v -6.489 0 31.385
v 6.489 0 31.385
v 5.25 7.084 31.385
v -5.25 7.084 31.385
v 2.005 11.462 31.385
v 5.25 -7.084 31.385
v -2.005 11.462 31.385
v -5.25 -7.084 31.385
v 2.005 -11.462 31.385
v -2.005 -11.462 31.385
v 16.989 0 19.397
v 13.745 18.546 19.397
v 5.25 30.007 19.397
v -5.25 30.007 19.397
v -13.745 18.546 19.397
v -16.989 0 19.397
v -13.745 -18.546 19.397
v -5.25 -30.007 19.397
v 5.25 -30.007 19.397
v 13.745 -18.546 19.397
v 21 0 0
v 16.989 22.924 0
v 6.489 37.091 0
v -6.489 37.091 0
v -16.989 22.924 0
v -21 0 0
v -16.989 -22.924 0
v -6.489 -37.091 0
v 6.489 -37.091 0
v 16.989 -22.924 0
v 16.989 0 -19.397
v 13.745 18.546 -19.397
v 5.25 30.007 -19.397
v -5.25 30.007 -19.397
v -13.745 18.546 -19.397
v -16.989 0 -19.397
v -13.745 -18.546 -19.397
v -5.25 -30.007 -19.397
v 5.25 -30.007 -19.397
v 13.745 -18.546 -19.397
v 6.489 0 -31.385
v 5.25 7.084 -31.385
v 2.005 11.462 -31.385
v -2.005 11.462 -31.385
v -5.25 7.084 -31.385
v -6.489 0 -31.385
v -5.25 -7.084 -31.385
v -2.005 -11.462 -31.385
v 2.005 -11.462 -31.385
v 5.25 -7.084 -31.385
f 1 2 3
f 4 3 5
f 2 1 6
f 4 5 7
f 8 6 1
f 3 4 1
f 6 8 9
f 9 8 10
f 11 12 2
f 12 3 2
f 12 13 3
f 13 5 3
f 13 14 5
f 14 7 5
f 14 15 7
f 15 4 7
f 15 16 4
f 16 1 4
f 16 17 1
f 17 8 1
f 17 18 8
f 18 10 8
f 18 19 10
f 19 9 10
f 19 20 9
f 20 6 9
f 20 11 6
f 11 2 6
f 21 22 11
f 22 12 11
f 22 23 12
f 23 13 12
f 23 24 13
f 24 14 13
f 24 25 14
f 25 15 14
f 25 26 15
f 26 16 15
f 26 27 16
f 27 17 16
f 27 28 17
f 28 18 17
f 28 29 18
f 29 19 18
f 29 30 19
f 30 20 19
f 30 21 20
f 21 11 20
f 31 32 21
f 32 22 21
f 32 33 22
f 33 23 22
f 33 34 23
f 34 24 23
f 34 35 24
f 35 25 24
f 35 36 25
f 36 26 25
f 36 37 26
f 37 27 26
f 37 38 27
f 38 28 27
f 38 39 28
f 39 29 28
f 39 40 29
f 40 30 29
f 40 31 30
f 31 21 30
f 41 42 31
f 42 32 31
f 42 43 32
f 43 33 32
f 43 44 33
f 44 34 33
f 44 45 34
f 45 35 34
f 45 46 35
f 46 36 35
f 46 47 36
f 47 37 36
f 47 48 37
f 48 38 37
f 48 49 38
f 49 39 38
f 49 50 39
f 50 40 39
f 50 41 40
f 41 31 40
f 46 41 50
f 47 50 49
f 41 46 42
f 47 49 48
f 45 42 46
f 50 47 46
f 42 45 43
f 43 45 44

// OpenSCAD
// Generated by SolidPython 1.0.1 on 2020-07-29 00:46:47


scale(v = [7, 13, 11]) {
	sphere(r = 3);
}
/***********************************************
*********      SolidPython code:      **********
************************************************
 
# import packages: SolidPython
from solid import *
from solid.utils import *
from itertools import chain, combinations, permutations


class Resize:

    def __init__(self, scad_file):
        self.scad_file = scad_file
        #self.scad_file = import_scad(scad_file)
        # cone/cylinder param:
        self.r1 = 0
        self.r2 = 0
        self.h = 0
        # rectangular prism param:
        self.w = 0
        self.l = 0
        # ellipse param:
        self.r = 0

    # import OpenScad code (file name corresponds to shape)


    # classify shape + parameters
    def assign(self, param1, param2, param3):
        if self.scad_file == 'cone.scad':
            self.r1 = param1
            self.r2 = param2
            self.h = param3
        elif self.scad_file == 'cylinder.scad':
            self.r1 = param1
            self.r2 = param2
            self.h = param3
        elif self.scad_file == 'rectangularPrism.scad':
            self.h = param1
            self.l = param2
            self.w = param3
        else:
            self.r = param1
            self.h = param2

    # resize parameters
    def iterate(self):
        x = range(3, 20, 2)
        i = 1
        if self.scad_file == 'cone.scad':
            tempList = list(permutations(x, 2))
            for temp in tempList:
                param1 = temp[0]
                param2 = temp[1]
                filepath = 'produced_scad_files/' + 'cone' + str(param1) + '_' + str(param2) + '_' + '.scad'
                scad_render_to_file(cylinder(h=param1, r1=param2, r2=0), filepath)

        elif self.scad_file == 'cylinder.scad':
            tempList = list(permutations(x, 3))
            for temp in tempList:
                param1 = temp[0]
                param2 = temp[1]
                filepath = 'produced_scad_files/' + 'cylinder' + str(param1) + '_' + str(param2) + '_' + '.scad'
                scad_render_to_file(cylinder(h=param1, r1=param2, r2=param2), filepath)

        elif self.scad_file == 'rectangularPrism.scad':
            tempList = list(permutations(x, 3))
            for temp in tempList:
                param1 = temp[0]
                param2 = temp[1]
                param3 = temp[2]
                filepath = 'produced_scad_files/' + 'rectangularPrism' + str(param1) + '_' + str(param2) + '_' + str(
                    param3) + '.scad'
                scad_render_to_file(cube(size=(param1, param2, param3)), filepath)

        elif self.scad_file == 'ellipse.scad':
            tempList = list(permutations(x, 4))
            for temp in tempList:
                param1 = temp[0]
                param2 = temp[1]
                param3 = temp[2]
                param4 = temp[3]
                filepath = 'produced_scad_files/' + 'ellipse' + str(param1) + '_' + str(param2) + '_' + str(param3) + '_' + str(param4) + '.scad'
                scad_render_to_file(scale([param1, param2, param3])(sphere(r=param4)), filepath)

    def render_to_scadfile(self):
        scad_render_to_file(scad, 'example.scad') 
 
************************************************/
